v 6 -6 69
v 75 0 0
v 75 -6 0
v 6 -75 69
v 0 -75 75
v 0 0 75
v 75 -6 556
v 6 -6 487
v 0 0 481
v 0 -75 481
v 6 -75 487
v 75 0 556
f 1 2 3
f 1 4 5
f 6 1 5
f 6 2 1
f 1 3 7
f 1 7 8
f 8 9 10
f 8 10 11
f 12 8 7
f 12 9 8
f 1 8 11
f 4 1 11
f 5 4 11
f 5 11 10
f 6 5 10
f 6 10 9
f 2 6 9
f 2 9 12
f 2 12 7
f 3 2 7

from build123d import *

# Parameters (mm, degrees)
F1_DEPTH = 556
F3_DEPTH = 75.001
F5_DEPTH = 75.001
F7_W     = 75
F7_H     = 75
F8_DEPTH = 556.001


with BuildPart() as f1:
    # F0 (on Top) → F1 (new body)
    with BuildSketch(Plane.XY):
        Polygon((0, 75), (0, 0), (75, 0), (75, 6), (6, 6), (6, 75), align=None)
    extrude(amount=F1_DEPTH)

    # F2 (on Front) → F3 (cut, through all)
    with BuildSketch(Plane.XZ):
        Polygon((0, 75), (0, 0), (75, 0), align=None)
    extrude(amount=-F3_DEPTH, mode=Mode.SUBTRACT)

    # F4 (on Front) → F5 (cut, through all)
    with BuildSketch(Plane.XZ):
        Polygon((0, 481), (75, 556), (0, 556), align=None)
    extrude(amount=-F5_DEPTH, mode=Mode.SUBTRACT)

    # F6: F1 across plane


with BuildPart() as f1_1:
    add(f1.part)
    add(f1.part.mirror(Plane.XZ))

    # F7 (on Top) → F8 (cut, through all)
    with BuildSketch(Plane.XY):
        with Locations((37.5, 37.5)):
            Rectangle(F7_W, F7_H)
    extrude(amount=F8_DEPTH, mode=Mode.SUBTRACT)


solid = f1_1.part
